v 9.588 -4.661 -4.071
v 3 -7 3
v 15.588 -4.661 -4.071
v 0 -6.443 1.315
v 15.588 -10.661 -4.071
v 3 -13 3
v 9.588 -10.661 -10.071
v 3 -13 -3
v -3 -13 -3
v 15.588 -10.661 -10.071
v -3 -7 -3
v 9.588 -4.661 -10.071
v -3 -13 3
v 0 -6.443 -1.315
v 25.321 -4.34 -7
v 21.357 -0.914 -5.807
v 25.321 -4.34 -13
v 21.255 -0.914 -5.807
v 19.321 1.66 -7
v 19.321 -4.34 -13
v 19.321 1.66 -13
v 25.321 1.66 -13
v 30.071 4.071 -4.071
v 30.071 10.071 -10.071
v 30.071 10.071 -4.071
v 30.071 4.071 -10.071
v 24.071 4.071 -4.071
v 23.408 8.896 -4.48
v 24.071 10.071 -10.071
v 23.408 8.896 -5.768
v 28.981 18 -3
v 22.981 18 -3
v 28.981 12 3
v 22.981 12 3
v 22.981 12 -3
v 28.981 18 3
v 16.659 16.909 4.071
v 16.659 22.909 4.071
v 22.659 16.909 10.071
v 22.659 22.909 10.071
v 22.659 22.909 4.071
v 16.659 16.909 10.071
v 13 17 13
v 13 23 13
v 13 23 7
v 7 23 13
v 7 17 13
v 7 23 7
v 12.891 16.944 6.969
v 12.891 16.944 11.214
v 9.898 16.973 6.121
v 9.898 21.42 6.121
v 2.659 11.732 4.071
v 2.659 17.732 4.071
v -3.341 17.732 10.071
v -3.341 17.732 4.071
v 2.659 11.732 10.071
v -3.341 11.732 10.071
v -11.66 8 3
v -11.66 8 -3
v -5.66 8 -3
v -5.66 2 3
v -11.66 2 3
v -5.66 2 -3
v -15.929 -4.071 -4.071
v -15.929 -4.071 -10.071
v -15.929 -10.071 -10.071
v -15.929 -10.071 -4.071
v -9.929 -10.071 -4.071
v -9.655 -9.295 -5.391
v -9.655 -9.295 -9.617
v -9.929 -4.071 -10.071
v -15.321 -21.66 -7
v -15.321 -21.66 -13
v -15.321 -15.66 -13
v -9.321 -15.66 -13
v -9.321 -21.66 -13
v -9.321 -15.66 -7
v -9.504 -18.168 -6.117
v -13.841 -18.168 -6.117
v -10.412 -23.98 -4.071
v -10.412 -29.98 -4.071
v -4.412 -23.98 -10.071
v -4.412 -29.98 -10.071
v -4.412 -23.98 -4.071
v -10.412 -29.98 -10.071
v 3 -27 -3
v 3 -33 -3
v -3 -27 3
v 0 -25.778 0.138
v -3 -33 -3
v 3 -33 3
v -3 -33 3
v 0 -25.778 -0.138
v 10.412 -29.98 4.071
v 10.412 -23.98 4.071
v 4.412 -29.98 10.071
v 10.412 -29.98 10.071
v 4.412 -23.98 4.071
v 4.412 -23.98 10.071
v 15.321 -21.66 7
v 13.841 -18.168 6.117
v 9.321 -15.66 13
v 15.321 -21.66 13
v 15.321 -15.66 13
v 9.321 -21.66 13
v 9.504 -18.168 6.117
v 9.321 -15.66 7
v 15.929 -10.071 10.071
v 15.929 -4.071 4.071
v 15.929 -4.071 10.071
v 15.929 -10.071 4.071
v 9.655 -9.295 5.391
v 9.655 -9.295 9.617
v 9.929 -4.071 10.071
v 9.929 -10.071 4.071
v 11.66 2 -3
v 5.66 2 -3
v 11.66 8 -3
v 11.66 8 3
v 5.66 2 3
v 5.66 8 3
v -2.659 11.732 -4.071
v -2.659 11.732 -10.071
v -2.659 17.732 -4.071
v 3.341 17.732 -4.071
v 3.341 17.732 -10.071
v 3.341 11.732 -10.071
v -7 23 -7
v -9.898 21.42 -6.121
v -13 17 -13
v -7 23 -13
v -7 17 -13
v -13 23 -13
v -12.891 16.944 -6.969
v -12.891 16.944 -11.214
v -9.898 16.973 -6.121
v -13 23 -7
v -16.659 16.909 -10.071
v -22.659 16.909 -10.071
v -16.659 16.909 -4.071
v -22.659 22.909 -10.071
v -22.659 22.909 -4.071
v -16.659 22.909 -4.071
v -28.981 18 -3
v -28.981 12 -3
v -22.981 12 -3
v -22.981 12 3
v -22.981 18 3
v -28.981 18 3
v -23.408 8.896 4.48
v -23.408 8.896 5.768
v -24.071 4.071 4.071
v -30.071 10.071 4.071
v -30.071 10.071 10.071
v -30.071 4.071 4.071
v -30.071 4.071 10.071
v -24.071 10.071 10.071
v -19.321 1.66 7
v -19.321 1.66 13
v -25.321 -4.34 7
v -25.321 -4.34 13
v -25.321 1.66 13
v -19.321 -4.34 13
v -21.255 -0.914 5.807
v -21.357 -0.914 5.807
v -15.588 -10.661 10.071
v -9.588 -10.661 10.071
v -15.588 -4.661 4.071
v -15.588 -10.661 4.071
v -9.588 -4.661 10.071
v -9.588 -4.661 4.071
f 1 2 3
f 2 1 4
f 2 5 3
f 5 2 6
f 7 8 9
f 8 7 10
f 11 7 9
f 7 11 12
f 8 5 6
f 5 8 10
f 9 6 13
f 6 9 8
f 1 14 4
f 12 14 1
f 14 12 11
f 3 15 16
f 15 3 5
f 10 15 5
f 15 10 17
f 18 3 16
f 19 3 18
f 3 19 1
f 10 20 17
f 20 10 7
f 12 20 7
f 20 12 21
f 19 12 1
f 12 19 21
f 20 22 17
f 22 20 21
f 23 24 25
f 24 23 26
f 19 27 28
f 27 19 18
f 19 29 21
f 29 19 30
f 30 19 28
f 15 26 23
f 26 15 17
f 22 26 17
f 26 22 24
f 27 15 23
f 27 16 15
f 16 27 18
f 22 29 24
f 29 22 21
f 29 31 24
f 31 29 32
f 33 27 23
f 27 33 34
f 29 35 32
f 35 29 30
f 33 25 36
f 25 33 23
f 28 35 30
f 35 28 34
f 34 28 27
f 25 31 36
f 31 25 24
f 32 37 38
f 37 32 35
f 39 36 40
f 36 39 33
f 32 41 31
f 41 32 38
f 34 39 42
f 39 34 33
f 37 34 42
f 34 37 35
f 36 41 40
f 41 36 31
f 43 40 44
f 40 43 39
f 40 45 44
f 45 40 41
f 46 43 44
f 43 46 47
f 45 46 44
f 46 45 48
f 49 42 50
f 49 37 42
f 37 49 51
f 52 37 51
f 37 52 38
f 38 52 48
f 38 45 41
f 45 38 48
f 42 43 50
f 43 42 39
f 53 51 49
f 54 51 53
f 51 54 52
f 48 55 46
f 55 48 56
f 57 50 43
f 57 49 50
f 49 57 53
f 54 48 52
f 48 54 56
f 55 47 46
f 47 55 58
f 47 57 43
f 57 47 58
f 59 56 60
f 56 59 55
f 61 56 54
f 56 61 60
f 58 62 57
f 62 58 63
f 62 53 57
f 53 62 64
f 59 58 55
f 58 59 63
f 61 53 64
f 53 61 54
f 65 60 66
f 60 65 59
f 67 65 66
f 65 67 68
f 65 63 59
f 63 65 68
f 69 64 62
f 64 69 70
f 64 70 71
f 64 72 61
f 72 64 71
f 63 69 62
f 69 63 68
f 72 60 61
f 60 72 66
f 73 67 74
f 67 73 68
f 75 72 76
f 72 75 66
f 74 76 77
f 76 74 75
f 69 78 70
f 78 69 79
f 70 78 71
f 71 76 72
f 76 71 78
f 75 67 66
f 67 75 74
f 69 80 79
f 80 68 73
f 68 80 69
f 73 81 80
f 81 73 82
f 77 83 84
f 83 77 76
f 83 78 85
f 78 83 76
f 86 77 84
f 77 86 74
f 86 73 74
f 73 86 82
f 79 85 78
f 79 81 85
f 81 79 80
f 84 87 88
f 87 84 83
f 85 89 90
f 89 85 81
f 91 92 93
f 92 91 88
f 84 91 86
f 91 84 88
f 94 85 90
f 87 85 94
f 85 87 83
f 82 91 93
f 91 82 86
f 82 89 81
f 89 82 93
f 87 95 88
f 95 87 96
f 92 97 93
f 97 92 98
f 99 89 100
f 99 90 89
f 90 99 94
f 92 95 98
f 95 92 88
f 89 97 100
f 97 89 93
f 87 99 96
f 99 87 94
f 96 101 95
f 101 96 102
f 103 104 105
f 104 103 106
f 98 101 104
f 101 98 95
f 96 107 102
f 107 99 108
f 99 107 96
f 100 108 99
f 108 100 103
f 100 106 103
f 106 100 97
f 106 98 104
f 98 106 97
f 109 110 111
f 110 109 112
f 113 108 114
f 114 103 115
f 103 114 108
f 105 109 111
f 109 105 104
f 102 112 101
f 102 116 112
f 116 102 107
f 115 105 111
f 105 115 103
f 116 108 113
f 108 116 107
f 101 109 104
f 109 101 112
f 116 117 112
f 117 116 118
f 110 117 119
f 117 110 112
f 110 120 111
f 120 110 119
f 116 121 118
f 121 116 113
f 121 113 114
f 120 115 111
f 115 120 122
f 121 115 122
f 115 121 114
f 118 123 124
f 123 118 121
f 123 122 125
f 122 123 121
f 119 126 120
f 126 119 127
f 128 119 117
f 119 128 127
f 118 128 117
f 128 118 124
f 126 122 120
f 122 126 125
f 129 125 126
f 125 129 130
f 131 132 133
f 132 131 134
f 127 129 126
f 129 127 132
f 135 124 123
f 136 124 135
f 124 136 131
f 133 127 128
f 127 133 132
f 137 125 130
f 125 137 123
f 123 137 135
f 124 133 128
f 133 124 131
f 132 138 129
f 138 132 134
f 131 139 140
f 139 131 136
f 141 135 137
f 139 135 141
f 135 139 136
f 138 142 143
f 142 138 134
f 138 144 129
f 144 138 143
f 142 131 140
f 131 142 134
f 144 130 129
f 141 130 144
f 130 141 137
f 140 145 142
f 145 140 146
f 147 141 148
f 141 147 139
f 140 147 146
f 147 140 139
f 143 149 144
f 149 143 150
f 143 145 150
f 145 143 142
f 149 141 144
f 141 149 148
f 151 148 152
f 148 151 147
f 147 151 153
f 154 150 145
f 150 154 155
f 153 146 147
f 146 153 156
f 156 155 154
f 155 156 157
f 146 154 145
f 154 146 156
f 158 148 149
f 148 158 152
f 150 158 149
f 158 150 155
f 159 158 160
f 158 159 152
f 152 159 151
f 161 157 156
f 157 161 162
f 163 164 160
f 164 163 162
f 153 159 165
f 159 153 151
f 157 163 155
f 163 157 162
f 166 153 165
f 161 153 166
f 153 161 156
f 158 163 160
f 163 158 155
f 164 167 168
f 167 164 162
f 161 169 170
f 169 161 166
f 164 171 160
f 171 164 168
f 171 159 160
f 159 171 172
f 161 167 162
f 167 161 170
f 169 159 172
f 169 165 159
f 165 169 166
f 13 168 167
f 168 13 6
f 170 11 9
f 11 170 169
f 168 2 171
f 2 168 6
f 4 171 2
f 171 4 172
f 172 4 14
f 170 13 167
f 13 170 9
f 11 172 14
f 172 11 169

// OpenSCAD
//!OpenSCAD

function x(t) = sin(t) + 2 * sin((2 * t));

function y(t) = cos(t) - 2 * cos((2 * t));

function z(t) = -sin((3 * t));

function doHsvMatrix(h,s,v,p,q,t,a=1)=[h<1?v:h<2?q:h<3?p:h<4?p:h<5?t:v,h<1?t:h<2?v:h<3?v:h<4?q:h<5?p:p,h<1?p:h<2?p:h<3?t:h<4?v:h<5?v:q,a];
function hsv(h, s=1, v=1,a=1)=doHsvMatrix((h%1)*6,s<0?0:s>1?1:s,v<0?0:v>1?1:v,v*(1-s),v*(1-s*((h%1)*6-floor((h%1)*6))),v*(1-s*(1-((h%1)*6-floor((h%1)*6)))),a);

// A trefoil knot can be described by these parametric equations:
// x(t) = sin(t) + 2sin(2t)
// y(t) = cos(t) - 2cos(2t)
// z(t) = -sin(3t)
// Each equation is represented by a module.  Given an input value of t, they return values for x, y, and z.
// These x,y,z values are used to translate a "point", which here is a cube.  Hulling the loop connects the points.
//
// To make the rainbow color, each cube is given a different hue in the chain hull loop.  Since the hue can run between 0 and 100, and the loop runs between 0 and 360, i is divided by (360 / 100) = 3.6.  You can get the rainbow loop twice through if you divide by 1.8.
// X size in mm
size_X = 10;
// Y size in mm
size_Y = 10;
// Z size in mm
size_Z = 10;

scale([size_X, size_Y, size_Z]){
  // chain hull
  for (i = [0 : abs(15) : 365 - 15]) {
    hull() {
    translate([(x(i)), (y(i)), (z(i))]){
      color(hsv(.01 * (i / 3.6), .01 * (100), .01 * (100))){
        cube([0.6, 0.6, 0.6], center=true);
      }
    }
    translate([(x((i + 15))), (y((i + 15))), (z((i + 15)))]){
      color(hsv(.01 * ((i + 15) / 3.6), .01 * (100), .01 * (100))){
        cube([0.6, 0.6, 0.6], center=true);
      }
    }
    }  // end hull (in loop)
   } // end loop

}
